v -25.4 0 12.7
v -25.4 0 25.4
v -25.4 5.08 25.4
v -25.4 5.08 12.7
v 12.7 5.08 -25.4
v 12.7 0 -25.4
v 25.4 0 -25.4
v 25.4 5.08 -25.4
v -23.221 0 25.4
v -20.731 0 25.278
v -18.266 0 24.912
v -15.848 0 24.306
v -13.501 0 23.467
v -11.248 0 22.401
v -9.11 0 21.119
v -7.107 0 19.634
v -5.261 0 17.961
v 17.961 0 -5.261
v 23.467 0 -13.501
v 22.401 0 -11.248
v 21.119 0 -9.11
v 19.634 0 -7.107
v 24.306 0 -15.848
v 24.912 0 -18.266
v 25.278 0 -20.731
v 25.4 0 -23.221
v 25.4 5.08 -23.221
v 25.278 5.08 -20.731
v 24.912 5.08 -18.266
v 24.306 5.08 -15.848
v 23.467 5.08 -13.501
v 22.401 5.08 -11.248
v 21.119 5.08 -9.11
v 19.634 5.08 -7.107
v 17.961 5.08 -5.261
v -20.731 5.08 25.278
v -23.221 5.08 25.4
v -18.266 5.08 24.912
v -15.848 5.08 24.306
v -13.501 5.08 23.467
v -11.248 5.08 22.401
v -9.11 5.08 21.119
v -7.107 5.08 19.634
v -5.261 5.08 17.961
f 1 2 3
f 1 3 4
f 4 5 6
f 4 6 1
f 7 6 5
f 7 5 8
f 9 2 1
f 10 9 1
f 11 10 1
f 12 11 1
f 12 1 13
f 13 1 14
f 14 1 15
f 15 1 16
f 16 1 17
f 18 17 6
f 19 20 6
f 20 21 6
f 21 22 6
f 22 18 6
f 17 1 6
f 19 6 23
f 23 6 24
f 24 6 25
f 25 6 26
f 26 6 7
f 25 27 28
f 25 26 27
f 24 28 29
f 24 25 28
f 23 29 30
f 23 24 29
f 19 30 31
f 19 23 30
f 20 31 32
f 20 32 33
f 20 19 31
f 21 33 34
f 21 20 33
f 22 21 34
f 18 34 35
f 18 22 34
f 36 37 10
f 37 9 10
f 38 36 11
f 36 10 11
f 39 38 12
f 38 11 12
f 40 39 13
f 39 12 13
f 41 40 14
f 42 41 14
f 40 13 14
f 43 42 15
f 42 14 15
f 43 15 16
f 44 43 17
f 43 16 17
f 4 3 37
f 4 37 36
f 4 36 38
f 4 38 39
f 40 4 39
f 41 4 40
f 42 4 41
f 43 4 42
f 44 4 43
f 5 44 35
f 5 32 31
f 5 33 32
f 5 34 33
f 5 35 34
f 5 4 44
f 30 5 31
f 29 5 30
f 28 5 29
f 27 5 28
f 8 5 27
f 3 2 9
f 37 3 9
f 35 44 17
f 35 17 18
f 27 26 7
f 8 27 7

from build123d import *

# Parameters (mm, degrees)
SKETCH1_W           = 50.8
SKETCH1_H           = 50.8
BOSS_EXTRUDE1_DEPTH = 5.08
CUT_EXTRUDE1_DEPTH  = 50.8
FILLET1_R           = 25.4


with BuildPart() as part:
    # Sketch1 → Boss-Extrude1 (new body)
    with BuildSketch(Plane(origin=(0, 0, 0), x_dir=(1, 0, 0), z_dir=(0, 1, 0))):
        Rectangle(SKETCH1_W, SKETCH1_H)
    extrude(amount=BOSS_EXTRUDE1_DEPTH)

    # Sketch6 → Cut-Extrude1 (cut)
    with BuildSketch(Plane(origin=(0, 5.08, 0), x_dir=(1, 0, 0), z_dir=(0, 1, 0))):
        Polygon((-25.4, -12.7), (-25.4, 25.4), (12.7, 25.4), align=None)
        Polygon((25.4, 12.7), (25.4, -25.4), (-12.7, -25.4), align=None)
    extrude(amount=-CUT_EXTRUDE1_DEPTH, mode=Mode.SUBTRACT)

    # Fillet1
    fillet1_edges = [part.edges().sort_by_distance(p)[0] for p in [
        (-12.7, 2.54, 25.4),
        (25.4, 2.54, -12.7),
    ]]
    fillet(fillet1_edges, radius=FILLET1_R)


solid = part.part
